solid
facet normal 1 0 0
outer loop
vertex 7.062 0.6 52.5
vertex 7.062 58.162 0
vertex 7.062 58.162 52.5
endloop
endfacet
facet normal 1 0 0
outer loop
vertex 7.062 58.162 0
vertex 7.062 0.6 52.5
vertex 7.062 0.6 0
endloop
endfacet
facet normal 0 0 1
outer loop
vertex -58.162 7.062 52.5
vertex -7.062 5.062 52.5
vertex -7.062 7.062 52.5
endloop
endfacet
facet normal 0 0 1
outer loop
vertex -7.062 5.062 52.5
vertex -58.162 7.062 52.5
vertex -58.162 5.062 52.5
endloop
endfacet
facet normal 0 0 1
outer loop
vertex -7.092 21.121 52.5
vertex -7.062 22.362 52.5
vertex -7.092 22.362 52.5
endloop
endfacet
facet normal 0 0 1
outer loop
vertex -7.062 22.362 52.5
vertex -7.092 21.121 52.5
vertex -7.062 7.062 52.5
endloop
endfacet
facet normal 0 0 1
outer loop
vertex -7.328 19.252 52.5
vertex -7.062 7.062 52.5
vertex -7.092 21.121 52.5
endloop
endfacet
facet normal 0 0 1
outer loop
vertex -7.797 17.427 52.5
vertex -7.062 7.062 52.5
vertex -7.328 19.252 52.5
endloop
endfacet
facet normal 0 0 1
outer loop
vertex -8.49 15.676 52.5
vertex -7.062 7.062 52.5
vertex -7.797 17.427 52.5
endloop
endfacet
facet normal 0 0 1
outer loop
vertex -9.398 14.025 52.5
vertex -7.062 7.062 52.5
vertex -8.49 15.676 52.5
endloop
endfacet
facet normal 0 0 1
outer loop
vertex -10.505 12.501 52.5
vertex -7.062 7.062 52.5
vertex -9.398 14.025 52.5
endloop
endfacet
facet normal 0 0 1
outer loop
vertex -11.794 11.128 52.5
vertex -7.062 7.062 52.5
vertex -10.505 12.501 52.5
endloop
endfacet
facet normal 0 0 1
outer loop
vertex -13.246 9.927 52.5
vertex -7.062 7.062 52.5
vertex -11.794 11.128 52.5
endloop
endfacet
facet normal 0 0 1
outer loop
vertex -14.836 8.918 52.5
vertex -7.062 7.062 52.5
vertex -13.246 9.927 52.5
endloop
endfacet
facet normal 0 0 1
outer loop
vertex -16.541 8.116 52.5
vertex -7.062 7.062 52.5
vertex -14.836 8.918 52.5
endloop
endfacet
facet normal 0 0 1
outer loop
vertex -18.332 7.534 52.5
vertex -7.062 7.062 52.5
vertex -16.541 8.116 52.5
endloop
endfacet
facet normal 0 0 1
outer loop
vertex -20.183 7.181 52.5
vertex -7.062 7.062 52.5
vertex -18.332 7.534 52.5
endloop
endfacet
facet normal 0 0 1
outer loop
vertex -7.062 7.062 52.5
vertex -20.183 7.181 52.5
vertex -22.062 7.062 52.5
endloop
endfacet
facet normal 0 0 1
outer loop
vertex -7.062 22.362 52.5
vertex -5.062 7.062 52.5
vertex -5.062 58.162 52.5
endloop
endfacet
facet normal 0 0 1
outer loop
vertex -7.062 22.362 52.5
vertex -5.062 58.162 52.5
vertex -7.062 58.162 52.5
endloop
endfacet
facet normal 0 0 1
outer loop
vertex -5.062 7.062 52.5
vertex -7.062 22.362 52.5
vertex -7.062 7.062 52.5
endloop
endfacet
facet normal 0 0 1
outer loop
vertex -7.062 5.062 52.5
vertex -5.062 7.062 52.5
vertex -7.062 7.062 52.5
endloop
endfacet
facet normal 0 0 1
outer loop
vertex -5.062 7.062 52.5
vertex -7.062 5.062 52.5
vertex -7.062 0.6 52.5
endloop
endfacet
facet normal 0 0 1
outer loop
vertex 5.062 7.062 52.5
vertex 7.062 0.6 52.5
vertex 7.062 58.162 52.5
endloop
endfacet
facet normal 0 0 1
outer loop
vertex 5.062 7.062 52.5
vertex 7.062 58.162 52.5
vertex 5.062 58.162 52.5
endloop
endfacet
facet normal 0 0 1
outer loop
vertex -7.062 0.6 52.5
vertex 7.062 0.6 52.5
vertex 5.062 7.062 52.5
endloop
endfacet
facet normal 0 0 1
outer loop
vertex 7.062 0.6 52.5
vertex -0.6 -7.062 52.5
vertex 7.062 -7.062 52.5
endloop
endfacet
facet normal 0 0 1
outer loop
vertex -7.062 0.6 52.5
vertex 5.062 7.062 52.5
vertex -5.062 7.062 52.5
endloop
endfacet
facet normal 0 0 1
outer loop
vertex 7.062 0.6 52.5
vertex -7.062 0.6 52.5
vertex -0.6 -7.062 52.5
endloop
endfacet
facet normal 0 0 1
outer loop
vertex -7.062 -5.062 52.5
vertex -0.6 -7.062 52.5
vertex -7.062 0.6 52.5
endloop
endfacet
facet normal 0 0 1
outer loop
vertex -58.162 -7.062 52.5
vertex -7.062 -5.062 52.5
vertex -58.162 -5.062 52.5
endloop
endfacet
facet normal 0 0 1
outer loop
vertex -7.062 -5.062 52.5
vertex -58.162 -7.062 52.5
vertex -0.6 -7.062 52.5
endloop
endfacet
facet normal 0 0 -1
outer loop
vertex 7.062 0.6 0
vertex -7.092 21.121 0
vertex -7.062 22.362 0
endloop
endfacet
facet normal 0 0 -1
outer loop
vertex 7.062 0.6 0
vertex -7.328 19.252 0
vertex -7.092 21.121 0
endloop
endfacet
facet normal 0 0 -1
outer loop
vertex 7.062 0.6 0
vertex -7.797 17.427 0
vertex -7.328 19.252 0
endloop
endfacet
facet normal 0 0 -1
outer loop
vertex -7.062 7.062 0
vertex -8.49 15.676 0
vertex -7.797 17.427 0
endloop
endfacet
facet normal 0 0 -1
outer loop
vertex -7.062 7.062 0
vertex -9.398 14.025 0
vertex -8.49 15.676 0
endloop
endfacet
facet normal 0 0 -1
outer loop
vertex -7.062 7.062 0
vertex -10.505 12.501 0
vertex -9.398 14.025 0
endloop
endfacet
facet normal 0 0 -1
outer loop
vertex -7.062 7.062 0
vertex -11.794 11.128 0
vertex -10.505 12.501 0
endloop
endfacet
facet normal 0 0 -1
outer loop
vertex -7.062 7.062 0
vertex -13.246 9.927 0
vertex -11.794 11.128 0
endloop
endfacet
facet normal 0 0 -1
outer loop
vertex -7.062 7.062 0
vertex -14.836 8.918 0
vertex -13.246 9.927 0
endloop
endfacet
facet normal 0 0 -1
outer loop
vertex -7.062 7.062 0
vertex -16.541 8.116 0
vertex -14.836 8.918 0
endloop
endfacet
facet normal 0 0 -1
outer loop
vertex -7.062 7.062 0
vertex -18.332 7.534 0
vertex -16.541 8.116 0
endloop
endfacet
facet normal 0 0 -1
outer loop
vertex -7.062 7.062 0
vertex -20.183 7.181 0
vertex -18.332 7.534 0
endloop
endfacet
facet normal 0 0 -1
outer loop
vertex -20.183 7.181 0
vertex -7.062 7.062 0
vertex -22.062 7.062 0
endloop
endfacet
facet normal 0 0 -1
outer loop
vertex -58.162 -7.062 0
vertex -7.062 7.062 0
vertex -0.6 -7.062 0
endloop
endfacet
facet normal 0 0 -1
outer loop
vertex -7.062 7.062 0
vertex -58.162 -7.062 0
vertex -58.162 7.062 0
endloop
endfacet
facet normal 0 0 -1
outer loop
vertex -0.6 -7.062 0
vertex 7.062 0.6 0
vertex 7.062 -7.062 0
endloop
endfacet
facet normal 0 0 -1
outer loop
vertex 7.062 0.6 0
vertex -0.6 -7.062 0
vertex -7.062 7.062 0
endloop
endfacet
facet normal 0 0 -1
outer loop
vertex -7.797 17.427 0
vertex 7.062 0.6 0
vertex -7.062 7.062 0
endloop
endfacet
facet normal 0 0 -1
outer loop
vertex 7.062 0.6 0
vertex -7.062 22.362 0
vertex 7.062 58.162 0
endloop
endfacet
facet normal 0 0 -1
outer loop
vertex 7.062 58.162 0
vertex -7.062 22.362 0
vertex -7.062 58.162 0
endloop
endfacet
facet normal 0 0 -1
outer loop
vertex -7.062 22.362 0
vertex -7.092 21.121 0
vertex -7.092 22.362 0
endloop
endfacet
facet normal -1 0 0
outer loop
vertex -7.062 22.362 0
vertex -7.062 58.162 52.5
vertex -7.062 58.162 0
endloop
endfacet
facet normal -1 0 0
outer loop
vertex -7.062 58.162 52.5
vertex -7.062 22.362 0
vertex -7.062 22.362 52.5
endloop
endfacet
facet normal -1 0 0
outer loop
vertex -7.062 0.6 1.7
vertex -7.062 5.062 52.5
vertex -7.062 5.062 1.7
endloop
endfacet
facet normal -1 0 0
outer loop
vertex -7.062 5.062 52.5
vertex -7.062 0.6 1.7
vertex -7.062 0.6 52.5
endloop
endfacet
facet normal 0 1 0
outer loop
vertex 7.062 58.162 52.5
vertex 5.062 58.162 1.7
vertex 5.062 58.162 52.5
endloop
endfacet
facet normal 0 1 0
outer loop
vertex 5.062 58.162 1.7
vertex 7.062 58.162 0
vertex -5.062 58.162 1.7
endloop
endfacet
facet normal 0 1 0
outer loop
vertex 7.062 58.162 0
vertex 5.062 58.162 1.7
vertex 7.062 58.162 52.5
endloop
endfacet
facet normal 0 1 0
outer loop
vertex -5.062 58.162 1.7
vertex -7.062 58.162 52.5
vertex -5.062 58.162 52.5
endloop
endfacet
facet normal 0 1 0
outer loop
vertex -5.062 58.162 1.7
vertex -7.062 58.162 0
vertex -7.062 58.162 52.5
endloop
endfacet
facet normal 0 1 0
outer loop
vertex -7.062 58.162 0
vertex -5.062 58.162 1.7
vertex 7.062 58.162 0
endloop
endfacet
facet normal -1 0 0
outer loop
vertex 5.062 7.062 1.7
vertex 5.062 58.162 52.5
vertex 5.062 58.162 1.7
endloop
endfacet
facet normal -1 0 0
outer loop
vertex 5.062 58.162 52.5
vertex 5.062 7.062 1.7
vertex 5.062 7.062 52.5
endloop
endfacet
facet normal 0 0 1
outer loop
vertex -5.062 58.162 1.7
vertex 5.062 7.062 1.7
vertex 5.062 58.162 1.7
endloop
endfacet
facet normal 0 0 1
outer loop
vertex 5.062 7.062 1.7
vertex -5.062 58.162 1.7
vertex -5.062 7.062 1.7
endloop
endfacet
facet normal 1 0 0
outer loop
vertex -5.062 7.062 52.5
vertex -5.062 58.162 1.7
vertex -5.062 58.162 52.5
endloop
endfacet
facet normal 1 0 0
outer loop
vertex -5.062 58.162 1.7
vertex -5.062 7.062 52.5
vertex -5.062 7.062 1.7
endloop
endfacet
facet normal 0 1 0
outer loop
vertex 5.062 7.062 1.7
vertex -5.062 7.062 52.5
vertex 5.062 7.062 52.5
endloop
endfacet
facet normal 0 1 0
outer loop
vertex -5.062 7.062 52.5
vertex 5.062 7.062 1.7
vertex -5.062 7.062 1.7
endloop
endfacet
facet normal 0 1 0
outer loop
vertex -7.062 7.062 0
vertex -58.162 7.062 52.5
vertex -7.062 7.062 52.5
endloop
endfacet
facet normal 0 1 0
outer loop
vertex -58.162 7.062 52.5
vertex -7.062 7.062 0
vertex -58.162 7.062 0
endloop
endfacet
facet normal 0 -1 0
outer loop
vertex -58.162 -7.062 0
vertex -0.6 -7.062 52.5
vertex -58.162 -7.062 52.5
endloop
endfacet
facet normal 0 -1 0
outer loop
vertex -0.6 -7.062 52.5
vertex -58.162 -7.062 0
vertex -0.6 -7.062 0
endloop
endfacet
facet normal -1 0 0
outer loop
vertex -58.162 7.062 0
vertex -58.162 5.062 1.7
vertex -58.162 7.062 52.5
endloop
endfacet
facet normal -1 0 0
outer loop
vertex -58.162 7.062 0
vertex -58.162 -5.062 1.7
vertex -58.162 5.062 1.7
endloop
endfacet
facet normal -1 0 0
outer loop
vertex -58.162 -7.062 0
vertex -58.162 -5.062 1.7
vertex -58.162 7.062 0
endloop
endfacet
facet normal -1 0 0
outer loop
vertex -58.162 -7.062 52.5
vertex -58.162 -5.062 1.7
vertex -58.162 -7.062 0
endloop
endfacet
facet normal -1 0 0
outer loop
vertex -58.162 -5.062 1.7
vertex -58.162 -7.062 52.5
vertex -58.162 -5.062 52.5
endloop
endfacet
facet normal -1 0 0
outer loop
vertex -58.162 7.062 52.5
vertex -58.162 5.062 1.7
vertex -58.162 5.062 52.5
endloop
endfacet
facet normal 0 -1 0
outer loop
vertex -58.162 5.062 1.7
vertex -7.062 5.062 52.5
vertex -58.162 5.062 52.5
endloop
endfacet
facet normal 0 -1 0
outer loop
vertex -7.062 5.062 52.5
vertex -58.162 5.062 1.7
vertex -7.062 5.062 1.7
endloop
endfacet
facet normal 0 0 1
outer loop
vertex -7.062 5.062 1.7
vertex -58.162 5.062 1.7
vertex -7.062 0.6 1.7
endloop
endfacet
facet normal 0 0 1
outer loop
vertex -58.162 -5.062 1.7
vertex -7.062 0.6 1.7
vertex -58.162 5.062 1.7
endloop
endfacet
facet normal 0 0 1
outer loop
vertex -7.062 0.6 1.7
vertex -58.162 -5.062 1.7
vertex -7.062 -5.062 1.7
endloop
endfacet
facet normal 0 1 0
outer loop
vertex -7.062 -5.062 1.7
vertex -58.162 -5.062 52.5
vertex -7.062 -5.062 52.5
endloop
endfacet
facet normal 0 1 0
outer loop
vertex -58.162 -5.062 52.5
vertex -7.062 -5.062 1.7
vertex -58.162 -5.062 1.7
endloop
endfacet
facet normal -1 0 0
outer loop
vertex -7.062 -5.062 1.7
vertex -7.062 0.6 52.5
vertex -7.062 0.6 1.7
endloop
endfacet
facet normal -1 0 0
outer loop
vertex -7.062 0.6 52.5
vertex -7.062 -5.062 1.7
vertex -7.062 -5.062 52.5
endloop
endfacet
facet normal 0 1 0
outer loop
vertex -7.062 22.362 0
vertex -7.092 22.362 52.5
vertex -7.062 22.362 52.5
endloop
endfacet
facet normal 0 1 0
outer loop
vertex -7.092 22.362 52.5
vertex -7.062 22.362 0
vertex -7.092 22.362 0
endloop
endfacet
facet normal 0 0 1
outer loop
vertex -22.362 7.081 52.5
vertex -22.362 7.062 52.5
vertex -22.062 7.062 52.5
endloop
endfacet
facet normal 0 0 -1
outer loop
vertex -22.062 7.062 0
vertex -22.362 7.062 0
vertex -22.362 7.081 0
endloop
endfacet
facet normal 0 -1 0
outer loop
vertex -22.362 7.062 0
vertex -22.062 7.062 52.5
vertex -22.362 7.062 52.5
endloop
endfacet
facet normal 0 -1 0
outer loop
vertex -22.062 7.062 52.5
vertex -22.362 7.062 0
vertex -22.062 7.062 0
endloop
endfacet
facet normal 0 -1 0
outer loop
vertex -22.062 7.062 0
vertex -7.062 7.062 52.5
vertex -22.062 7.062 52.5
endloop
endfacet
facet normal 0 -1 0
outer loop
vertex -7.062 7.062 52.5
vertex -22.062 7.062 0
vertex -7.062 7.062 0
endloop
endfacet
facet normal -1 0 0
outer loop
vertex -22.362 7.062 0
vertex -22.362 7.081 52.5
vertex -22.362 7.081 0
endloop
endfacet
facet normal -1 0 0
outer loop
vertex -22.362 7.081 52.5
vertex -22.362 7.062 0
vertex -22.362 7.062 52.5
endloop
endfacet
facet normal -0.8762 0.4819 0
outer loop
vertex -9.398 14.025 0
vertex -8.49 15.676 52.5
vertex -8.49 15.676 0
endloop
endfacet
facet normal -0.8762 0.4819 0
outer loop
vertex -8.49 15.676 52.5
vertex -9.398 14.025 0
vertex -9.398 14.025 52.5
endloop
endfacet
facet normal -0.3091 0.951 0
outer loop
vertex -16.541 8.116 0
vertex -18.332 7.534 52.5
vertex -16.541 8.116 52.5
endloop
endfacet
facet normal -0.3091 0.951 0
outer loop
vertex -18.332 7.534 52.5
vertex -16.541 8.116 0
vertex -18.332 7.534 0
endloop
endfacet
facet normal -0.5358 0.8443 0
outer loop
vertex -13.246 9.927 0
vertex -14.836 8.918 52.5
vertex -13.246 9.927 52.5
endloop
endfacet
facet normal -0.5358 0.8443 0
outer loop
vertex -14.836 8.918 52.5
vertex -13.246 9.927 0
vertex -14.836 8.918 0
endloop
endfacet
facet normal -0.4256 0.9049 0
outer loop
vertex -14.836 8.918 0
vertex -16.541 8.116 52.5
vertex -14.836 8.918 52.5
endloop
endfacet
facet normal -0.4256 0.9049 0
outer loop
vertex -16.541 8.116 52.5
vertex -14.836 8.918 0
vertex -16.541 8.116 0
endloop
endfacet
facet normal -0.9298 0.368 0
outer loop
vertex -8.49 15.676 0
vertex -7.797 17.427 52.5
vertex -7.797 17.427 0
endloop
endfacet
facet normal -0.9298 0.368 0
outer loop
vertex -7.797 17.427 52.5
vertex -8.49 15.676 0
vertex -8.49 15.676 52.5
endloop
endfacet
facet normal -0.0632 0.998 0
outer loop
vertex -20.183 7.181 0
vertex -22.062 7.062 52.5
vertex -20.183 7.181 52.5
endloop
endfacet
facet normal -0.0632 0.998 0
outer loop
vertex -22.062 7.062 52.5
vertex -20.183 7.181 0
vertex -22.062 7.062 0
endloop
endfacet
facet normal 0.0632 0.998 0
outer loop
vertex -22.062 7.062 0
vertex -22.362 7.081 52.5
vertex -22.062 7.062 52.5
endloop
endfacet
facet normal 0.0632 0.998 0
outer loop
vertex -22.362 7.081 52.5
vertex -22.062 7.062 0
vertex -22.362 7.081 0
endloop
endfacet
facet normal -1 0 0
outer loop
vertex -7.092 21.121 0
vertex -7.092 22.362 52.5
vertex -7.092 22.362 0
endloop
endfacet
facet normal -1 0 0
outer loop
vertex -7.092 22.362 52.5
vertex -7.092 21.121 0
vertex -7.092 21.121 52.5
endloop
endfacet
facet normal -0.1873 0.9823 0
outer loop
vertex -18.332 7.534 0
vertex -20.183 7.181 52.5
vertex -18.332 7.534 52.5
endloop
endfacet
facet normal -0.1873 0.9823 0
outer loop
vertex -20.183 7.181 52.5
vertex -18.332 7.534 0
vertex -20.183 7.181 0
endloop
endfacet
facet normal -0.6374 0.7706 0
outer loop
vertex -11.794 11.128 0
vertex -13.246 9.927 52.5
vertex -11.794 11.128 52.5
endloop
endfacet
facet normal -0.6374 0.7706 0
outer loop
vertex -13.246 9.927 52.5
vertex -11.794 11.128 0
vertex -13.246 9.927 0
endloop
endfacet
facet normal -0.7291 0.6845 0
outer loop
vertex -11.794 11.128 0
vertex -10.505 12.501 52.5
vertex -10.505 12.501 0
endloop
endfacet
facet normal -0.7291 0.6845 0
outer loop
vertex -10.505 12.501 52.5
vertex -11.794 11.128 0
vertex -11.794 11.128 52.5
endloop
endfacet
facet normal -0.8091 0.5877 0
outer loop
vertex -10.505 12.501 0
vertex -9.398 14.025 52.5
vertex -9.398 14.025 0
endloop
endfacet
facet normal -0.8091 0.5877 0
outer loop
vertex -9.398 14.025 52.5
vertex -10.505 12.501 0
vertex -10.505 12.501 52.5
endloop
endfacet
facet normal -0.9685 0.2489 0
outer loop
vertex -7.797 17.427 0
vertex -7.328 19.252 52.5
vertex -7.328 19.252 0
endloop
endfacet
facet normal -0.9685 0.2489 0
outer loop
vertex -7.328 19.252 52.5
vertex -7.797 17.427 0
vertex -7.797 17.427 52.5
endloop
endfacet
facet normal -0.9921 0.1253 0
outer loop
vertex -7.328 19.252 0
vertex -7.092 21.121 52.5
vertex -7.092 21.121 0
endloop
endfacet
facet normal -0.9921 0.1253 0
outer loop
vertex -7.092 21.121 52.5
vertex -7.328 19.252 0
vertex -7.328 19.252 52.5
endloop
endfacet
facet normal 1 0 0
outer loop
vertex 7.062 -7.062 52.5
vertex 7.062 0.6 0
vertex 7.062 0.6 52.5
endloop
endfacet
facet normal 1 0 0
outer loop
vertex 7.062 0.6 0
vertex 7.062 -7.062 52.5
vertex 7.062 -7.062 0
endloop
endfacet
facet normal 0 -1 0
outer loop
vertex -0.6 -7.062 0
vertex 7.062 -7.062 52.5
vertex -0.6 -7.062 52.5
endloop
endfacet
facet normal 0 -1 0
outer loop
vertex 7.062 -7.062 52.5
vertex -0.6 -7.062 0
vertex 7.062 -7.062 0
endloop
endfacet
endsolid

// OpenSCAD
// conversion from inches to mm
INCH = 25.4;

// plastic wall thickness
thickness = 2;

// board thickness
boardThickness = 0.375 * INCH;

// depth for board cover
boardDepth = 2 * INCH;

// spacing square size
spacing = boardThickness + thickness * 2;

// shrinkage allowance
shrinkage = .3;

// radius of joins
radius = 15;

module thruBoard()
{
    translate([-thickness - shrinkage - boardThickness/2,-boardDepth-spacing/2,0]) difference() {
        cube([thickness * 2 + boardThickness + shrinkage * 2, boardDepth * 2 + spacing, boardDepth + shrinkage]);
        translate([thickness, -shrinkage, thickness - shrinkage]) cube([boardThickness + shrinkage * 2, boardDepth + shrinkage * 2, boardDepth + shrinkage]);
        translate([thickness, boardDepth + spacing - shrinkage, thickness - shrinkage]) cube([boardThickness + shrinkage * 2, boardDepth + shrinkage * 2, boardDepth + shrinkage]);
    }
}


module single()
{
    translate([-thickness - shrinkage - boardThickness/2,shrinkage*2,0])difference() {
        cube([thickness * 2 + boardThickness + shrinkage * 2, boardDepth + spacing/2, boardDepth + thickness - shrinkage]);
        #translate([thickness, spacing/2 - shrinkage, thickness - shrinkage]) cube([boardThickness + shrinkage * 2, boardDepth + shrinkage * 2, boardDepth + shrinkage]);
    }
}

module centerSquare()
{
    translate([-spacing/2 - shrinkage,-spacing/2 - shrinkage,0]) cube([spacing + shrinkage * 2,spacing + shrinkage * 2,boardDepth - shrinkage + thickness]);
}

module join()
{
    translate([spacing/2+shrinkage,spacing/2+shrinkage,0])difference() {
            cube([radius+shrinkage,radius+shrinkage,boardDepth+thickness-shrinkage]);
            translate([radius, radius, -shrinkage]) cylinder($fn=50,r=radius,h=boardDepth+thickness+shrinkage);
    }
}

module hexCorner()
{
    union() {
        single();
        rotate([0,0,120]) single();
        rotate([0,0,240]) single();
    }
}

module L2()
{
    union() {
        single();
        rotate([0,0,90]) single();
        centerSquare();
        rotate([0,0,90]) join();
    }
}

module R2()
{
    union() {
        single();
        rotate([0,0,-90]) single();
        centerSquare();
        join();
    }
}

L2();
